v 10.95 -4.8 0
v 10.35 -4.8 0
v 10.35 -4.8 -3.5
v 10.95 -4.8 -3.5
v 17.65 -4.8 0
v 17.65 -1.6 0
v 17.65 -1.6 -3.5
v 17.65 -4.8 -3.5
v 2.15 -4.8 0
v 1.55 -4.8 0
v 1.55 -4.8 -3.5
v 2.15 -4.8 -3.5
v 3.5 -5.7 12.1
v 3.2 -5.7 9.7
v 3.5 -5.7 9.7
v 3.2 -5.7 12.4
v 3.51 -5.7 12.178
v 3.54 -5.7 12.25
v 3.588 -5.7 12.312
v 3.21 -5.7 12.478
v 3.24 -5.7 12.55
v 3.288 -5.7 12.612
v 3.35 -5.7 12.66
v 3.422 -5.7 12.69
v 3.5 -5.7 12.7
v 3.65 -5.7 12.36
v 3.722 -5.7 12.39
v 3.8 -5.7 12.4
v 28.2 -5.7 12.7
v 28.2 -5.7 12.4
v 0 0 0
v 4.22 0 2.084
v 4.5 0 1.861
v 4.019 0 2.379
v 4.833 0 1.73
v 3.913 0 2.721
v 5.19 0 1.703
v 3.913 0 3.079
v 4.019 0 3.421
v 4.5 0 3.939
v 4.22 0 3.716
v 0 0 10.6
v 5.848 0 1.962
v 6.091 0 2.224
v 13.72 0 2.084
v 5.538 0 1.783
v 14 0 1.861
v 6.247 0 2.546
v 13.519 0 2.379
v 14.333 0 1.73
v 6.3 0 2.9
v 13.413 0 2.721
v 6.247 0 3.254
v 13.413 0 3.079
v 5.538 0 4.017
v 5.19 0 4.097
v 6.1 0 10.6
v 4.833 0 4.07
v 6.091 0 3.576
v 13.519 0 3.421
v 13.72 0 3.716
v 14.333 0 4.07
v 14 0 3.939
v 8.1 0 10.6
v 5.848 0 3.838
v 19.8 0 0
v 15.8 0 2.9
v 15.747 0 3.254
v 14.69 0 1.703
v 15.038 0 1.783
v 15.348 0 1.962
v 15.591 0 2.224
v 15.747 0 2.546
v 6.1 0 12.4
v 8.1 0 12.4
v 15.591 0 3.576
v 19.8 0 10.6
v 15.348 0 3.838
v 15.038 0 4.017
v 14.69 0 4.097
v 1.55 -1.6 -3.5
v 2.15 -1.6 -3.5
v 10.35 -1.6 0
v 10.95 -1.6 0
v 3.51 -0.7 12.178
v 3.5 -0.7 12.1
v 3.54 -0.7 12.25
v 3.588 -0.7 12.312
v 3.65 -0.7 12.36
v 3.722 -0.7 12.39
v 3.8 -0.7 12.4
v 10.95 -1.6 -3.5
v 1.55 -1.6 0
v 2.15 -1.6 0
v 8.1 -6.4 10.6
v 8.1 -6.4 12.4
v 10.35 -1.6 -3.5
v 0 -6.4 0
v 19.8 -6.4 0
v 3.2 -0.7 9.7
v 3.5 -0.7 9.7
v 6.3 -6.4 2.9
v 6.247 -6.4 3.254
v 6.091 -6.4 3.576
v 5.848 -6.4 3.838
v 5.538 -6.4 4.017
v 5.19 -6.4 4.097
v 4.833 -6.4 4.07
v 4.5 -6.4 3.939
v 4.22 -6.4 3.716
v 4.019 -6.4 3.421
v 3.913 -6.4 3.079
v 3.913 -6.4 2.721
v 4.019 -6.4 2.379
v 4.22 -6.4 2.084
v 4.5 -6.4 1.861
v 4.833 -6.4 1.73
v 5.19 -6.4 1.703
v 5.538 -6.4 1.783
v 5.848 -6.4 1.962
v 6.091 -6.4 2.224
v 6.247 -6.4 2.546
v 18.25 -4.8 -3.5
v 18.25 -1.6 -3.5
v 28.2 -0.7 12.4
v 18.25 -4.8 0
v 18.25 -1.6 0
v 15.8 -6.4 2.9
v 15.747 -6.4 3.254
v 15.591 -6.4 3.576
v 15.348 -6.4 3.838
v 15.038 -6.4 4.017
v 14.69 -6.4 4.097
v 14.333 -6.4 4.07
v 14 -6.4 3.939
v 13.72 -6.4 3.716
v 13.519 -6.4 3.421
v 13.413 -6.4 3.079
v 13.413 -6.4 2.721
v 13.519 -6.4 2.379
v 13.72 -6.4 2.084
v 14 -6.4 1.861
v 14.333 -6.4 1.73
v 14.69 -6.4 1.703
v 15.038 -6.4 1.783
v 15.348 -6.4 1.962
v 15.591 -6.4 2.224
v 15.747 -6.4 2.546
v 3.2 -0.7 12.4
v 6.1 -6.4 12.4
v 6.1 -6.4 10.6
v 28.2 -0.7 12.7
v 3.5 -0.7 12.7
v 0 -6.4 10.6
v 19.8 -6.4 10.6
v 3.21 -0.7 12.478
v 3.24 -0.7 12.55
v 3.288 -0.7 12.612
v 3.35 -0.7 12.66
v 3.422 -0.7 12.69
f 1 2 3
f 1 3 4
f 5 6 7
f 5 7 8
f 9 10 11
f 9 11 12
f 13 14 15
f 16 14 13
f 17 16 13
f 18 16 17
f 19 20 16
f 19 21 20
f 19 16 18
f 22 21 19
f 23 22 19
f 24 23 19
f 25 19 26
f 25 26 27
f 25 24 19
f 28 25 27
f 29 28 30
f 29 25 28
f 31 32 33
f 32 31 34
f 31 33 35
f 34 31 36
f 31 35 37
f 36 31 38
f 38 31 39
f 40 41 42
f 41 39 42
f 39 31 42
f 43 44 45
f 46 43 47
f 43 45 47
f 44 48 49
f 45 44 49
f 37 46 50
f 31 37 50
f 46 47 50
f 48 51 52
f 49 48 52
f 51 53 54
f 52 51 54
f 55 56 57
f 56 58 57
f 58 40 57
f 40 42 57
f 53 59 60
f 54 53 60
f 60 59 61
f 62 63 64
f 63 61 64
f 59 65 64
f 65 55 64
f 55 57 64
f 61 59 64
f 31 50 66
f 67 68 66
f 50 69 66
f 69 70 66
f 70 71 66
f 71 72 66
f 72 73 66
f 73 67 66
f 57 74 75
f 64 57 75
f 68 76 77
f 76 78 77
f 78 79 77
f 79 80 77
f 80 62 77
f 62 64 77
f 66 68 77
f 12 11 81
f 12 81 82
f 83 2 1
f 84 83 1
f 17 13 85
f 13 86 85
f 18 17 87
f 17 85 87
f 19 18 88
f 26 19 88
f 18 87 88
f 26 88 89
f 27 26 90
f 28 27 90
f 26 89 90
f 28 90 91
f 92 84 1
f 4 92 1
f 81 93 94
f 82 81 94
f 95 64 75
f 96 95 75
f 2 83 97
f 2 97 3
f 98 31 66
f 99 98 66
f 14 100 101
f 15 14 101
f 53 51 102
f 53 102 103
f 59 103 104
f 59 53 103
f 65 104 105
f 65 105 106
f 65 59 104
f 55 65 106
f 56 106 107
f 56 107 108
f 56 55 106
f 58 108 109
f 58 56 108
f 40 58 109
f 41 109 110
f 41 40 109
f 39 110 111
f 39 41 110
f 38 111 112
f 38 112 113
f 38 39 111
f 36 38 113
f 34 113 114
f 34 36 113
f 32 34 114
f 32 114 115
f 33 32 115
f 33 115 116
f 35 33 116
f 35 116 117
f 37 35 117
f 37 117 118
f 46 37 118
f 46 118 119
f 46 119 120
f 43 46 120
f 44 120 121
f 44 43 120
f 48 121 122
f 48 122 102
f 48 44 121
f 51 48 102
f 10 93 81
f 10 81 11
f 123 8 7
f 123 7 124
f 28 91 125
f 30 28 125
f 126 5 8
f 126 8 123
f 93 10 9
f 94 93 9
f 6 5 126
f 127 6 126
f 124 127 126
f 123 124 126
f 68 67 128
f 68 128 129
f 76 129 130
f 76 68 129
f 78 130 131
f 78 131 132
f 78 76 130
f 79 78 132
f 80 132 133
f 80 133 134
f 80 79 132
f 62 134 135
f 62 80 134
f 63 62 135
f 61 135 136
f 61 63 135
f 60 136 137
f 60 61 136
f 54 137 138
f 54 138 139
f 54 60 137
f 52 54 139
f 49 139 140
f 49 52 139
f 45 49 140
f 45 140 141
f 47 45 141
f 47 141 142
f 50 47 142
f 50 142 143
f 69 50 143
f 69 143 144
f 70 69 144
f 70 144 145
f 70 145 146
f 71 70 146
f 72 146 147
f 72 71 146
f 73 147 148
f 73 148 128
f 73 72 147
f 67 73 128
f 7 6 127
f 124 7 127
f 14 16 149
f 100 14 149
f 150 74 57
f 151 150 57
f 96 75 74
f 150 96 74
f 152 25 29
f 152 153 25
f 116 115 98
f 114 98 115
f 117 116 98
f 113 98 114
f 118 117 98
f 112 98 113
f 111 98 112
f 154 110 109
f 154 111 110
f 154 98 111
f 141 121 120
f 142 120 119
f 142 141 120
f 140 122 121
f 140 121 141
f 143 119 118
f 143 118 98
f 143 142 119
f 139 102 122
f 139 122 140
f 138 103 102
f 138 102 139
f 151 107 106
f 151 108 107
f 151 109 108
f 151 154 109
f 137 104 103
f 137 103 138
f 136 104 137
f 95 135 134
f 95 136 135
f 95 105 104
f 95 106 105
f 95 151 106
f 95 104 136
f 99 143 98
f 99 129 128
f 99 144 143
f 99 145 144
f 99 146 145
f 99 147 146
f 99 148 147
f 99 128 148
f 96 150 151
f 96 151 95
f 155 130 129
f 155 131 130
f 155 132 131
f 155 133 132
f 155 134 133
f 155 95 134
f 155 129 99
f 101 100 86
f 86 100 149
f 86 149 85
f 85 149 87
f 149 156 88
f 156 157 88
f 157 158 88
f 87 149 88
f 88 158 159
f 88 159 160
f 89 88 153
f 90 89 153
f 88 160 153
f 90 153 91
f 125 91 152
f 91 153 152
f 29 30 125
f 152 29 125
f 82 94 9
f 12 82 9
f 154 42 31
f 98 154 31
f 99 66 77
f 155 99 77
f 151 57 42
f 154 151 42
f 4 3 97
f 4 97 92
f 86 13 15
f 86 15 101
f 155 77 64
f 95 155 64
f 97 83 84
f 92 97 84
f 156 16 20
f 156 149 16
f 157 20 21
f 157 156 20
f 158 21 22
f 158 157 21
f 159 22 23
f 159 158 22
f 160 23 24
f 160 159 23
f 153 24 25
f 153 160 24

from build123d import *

# Parameters (mm, degrees)
F0_R     = 1.2
F1_DEPTH = 6.4
F2_W     = 0.6
F2_H     = 3.2
F3_DEPTH = 3.5
F4_W     = 25
F4_H     = 5
F5_DEPTH = 0.3
F6_W     = 0.3
F6_H     = 5
F7_DEPTH = 3
F8_R     = 0.3


with BuildPart() as f1:
    # F0 (on Front) → F1 (new body)
    with BuildSketch(Plane.XZ):
        Polygon((0, 10.6), (0, 0), (19.8, 0), (19.8, 10.6), (8.1, 10.6), (8.1, 12.4), (6.1, 12.4), (6.1, 10.6), align=None)
        with Locations((5.1, 2.9)):
            Circle(F0_R, mode=Mode.SUBTRACT)
        with Locations((14.6, 2.9)):
            Circle(F0_R, mode=Mode.SUBTRACT)
    extrude(amount=F1_DEPTH)


with BuildPart() as f3:
    # F2 (on face) → F3 (new body)
    with BuildSketch(Plane(origin=(0, 0, 0), x_dir=(1, 0, 0), z_dir=(0, 0, -1))):
        with Locations((1.85, 3.2)):
            Rectangle(F2_W, F2_H)
    extrude(amount=F3_DEPTH)


with BuildPart() as f3b:
    # F2 (on face) → F3, piece 2 (new body)
    with BuildSketch(Plane(origin=(0, 0, 0), x_dir=(1, 0, 0), z_dir=(0, 0, -1))):
        with Locations((10.65, 3.2)):
            Rectangle(F2_W, F2_H)
    extrude(amount=F3_DEPTH)


with BuildPart() as f3c:
    # F2 (on face) → F3, piece 3 (new body)
    with BuildSketch(Plane(origin=(0, 0, 0), x_dir=(1, 0, 0), z_dir=(0, 0, -1))):
        with Locations((17.95, 3.2)):
            Rectangle(F2_W, F2_H)
    extrude(amount=F3_DEPTH)


with BuildPart() as f5:
    # F4 (on face) → F5 (new body)
    with BuildSketch(Plane.XY.offset(12.4)):
        with Locations((15.7, -3.2)):
            Rectangle(F4_W, F4_H)
    extrude(amount=F5_DEPTH)

    # F6 (on face) → F7 (join)
    with BuildSketch(Plane.XY.offset(12.7)):
        with Locations((3.35, -3.2)):
            Rectangle(F6_W, F6_H)
    extrude(amount=-F7_DEPTH)

    # F8
    f8_edges = [f5.edges().sort_by_distance(p)[0] for p in [
        (3.2, -3.2, 12.7),
        (3.5, -3.2, 12.4),
    ]]
    fillet(f8_edges, radius=F8_R)


solid = Compound([f1.part, f3.part, f3b.part, f3c.part, f5.part])
